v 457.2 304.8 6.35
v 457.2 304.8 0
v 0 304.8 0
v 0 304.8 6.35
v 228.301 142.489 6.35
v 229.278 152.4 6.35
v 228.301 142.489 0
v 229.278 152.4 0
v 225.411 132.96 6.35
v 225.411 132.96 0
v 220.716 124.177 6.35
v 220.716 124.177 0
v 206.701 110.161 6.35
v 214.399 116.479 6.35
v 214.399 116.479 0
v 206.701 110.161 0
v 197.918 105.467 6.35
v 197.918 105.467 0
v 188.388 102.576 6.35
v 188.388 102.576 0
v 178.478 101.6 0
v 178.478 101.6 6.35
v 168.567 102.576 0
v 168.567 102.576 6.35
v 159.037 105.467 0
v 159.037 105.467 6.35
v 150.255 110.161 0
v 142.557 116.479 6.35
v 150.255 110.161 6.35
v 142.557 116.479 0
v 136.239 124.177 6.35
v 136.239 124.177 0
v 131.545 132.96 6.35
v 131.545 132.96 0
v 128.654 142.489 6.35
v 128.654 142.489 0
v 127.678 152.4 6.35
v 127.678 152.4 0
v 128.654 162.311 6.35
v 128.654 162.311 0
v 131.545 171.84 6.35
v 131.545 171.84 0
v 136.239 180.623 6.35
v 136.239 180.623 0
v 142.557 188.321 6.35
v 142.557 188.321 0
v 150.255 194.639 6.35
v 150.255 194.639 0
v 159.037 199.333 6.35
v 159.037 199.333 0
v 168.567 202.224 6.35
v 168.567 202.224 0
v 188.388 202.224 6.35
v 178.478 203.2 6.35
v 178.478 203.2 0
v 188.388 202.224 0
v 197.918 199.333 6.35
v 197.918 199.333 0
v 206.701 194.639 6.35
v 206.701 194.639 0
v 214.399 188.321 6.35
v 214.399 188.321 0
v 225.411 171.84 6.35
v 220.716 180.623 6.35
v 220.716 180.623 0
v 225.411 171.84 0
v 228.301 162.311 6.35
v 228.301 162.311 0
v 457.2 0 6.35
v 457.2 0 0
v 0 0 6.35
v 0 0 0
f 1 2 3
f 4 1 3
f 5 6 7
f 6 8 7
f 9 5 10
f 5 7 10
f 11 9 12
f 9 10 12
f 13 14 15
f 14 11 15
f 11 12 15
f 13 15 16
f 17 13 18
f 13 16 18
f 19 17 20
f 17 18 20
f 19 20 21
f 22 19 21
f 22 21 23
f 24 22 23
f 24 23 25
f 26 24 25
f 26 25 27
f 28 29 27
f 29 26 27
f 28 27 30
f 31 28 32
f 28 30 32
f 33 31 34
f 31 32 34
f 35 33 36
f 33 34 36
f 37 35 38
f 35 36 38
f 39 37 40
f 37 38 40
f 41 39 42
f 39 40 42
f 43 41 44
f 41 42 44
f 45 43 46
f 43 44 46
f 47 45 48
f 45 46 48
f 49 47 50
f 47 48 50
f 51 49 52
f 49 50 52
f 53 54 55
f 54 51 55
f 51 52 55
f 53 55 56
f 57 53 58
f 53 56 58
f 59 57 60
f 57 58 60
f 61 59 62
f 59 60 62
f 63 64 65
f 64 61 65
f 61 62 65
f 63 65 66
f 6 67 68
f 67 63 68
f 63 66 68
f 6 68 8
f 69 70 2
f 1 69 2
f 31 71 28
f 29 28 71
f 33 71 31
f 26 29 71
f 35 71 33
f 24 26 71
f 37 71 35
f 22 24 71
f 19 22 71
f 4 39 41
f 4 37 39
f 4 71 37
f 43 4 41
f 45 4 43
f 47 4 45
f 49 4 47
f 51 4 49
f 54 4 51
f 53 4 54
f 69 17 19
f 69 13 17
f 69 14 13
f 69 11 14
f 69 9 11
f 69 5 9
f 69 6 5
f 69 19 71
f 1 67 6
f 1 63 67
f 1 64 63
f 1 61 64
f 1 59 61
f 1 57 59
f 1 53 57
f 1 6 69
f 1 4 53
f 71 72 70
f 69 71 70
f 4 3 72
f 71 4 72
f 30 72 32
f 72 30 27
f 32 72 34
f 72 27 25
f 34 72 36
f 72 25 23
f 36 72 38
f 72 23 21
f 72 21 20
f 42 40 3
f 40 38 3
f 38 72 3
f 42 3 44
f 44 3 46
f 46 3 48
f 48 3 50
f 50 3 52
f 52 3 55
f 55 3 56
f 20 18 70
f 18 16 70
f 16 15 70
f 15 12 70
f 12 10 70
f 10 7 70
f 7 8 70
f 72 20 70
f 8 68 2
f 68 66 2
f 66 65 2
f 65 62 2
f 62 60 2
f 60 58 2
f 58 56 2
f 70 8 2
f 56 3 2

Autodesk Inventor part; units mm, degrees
ref_plane "YZ Plane" through (0, 0, 0) normal (1, 0, 0) x (0, 1, 0)
ref_plane "XZ Plane" through (0, 0, 0) normal (0, 1, 0) x (-1, 0, 0)
ref_plane "XY Plane" through (0, 0, 0) normal (0, 0, 1) x (1, 0, 0)
sketch "Sketch1" plane through (0, 0, 0) normal (0, 0, 1) x (1, 0, 0)
  line L0 (0, 0) -> (457.2, 0)
  line L1 (457.2, 0) -> (457.2, 304.8)
  line L2 (457.2, 304.8) -> (0, 304.8)
  line L3 (0, 304.8) -> (0, 0)
  line L4 (0, 254) -> (457.2, 254)
  arc A0 (0.6776, 254) -> (325.1105, 153.4434) centre (178.4776, 254) ccw
  circle A1 centre (178.4776, 152.4) radius 50.8
  line L5 (394.0694, 254) -> (325.1105, 153.4434)
  dimension "d0" = 457.2
  dimension "d1" = 304.8
  dimension "d4" = 101.6
sketch "Sketch2" plane through (0, 0, 0) normal (0, 0, 1) x (1, 0, 0)
  point P0 (0, 0)
extrude "Extrusion1" add sketch "Sketch1" along normal blind 6.35
properties part number "ShooterWall"
